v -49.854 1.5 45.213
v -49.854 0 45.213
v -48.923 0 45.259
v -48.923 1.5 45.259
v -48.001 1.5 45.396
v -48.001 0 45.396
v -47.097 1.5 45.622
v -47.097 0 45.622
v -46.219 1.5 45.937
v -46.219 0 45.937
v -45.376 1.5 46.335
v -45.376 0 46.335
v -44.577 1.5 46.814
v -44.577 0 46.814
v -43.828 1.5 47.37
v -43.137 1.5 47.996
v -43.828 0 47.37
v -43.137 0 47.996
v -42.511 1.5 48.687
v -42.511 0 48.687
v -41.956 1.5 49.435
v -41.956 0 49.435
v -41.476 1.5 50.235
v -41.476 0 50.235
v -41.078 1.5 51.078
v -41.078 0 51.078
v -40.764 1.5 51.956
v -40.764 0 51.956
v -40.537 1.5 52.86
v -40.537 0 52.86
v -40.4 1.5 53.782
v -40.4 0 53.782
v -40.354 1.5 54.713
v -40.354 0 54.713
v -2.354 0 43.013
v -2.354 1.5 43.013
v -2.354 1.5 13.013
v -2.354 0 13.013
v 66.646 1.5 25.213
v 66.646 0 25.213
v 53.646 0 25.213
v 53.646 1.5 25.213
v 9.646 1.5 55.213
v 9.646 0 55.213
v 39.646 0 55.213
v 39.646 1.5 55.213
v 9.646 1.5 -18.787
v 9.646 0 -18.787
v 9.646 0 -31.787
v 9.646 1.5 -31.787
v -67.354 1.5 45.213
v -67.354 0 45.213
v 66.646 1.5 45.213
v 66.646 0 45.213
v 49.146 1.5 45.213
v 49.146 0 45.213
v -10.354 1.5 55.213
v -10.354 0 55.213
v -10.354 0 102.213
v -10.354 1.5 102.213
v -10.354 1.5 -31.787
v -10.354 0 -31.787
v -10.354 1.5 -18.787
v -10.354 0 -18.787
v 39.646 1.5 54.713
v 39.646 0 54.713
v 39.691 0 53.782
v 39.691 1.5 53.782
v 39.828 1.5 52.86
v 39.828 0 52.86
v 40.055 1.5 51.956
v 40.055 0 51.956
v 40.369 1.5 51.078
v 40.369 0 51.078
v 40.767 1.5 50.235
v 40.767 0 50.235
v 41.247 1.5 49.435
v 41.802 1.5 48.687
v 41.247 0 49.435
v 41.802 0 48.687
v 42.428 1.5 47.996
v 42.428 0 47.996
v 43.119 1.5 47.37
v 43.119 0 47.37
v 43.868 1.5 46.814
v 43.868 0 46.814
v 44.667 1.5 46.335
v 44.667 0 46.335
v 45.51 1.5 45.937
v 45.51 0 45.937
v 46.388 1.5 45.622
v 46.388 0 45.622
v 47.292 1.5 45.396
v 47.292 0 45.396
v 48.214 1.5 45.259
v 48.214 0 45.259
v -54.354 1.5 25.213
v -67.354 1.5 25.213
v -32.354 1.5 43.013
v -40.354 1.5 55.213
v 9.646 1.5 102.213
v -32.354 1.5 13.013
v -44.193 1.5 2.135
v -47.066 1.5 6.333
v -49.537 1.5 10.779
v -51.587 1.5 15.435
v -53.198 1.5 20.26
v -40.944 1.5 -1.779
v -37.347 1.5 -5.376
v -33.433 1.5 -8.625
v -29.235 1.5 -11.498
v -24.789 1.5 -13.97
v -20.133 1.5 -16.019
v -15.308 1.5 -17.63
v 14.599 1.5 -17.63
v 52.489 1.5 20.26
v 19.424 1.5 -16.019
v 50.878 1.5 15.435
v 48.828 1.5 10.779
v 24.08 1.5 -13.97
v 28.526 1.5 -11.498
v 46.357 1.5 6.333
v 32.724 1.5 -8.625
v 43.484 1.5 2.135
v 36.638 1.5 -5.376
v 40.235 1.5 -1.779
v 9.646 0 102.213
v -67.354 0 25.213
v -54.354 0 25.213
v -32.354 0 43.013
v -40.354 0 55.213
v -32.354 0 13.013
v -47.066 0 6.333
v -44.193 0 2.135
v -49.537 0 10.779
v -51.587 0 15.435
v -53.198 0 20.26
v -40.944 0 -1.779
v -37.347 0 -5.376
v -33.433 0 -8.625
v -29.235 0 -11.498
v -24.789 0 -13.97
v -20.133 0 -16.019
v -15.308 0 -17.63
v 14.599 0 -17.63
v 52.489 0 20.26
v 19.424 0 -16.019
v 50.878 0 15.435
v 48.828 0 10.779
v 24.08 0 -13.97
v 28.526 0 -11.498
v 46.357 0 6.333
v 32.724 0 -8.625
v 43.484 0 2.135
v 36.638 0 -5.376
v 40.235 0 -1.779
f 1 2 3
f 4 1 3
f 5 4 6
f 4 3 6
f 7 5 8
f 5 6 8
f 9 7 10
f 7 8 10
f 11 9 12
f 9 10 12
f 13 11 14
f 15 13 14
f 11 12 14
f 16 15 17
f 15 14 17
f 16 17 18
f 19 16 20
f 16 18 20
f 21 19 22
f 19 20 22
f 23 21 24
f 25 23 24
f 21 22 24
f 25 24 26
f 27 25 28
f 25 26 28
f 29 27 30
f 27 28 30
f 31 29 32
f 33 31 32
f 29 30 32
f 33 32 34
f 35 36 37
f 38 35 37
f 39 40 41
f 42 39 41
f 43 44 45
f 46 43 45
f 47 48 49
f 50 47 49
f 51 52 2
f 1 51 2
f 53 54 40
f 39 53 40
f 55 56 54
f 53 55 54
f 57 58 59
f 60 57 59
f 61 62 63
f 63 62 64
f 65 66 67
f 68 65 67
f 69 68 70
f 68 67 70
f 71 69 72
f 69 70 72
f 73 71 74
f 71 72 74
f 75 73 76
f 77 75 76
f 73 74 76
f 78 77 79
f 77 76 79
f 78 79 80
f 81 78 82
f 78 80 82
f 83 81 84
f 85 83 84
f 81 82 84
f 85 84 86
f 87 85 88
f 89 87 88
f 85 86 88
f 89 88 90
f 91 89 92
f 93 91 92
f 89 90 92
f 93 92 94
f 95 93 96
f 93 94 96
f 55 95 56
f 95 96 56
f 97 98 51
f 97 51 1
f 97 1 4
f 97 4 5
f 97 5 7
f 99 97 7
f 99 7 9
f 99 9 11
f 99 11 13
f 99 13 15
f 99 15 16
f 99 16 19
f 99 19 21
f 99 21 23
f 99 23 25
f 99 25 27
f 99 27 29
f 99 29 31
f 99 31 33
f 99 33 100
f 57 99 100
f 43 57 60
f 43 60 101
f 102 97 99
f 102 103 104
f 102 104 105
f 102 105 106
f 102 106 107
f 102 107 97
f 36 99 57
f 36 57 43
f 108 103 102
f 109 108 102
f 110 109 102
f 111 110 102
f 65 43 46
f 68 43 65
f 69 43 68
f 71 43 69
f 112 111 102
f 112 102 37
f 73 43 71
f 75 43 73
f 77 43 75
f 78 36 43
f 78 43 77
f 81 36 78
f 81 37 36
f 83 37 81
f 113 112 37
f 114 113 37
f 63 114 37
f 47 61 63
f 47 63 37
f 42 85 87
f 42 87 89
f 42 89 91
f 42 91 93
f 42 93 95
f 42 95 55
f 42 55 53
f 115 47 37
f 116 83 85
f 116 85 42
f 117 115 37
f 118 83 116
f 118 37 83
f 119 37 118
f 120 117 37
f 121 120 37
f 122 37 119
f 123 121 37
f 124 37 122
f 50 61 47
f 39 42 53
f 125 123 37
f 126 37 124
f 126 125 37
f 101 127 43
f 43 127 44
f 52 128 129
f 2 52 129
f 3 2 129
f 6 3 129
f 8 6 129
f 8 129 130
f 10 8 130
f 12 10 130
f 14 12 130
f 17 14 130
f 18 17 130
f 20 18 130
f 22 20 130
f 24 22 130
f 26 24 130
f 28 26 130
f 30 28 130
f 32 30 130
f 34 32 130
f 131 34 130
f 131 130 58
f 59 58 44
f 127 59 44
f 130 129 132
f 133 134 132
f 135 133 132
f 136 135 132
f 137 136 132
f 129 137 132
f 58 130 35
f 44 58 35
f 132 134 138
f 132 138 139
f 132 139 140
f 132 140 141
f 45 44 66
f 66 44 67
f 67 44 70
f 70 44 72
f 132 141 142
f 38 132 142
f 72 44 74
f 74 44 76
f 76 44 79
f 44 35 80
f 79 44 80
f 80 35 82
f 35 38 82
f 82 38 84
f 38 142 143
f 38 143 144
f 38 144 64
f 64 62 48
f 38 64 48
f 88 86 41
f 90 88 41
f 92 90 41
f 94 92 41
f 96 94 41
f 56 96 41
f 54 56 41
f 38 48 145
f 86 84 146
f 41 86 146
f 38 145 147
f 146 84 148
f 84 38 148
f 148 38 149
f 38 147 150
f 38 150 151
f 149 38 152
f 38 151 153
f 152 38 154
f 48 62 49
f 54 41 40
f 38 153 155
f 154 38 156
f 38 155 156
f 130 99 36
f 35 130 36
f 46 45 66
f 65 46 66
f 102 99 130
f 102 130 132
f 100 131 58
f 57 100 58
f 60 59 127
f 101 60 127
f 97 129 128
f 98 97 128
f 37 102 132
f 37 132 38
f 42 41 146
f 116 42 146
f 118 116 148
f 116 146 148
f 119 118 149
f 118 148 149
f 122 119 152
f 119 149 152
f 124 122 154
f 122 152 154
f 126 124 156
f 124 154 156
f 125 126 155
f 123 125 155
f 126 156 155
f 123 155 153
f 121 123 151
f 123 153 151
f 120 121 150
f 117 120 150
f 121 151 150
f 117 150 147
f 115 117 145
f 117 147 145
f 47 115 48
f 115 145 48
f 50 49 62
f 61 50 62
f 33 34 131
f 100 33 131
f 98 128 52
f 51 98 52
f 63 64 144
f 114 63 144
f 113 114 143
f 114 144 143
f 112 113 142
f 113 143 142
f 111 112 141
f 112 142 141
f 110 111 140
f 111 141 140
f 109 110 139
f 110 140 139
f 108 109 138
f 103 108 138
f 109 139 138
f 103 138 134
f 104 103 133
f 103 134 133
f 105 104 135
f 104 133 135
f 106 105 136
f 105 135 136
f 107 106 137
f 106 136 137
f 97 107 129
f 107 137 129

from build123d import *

# Parameters (mm, degrees)
SALIENTE_EXTRUIR1_DEPTH = 1.5
CROQUIS2_W              = 30
CROQUIS2_H              = 30
CORTAR_EXTRUIR1_DEPTH   = 123.41919068


with BuildPart() as part:
    # Croquis1 → Saliente-Extruir1 (new body)
    with BuildSketch(Plane(origin=(0, 0, 0), x_dir=(1, 0, 0), z_dir=(0, 1, 0))):
        with BuildLine():
            Line((-10.354497354, 18.78659612), (-10.354497354, -55.21340388))
            Line((-10.354497354, -55.21340388), (-10.354497354, -102.21340388))
            Line((-10.354497354, -102.21340388), (9.645502646, -102.21340388))
            Line((9.645502646, -102.21340388), (9.645502646, -55.21340388))
            Line((9.645502646, -55.21340388), (9.645502646, 18.78659612))
            ThreePointArc((9.645502646, 18.78659612), (-0.354497354, 19.704716991), (-10.354497354, 18.78659612))
        make_face()
        with BuildLine():
            ThreePointArc((53.645502646, -25.21340388), (38.478478323, 3.619571798), (9.645502646, 18.78659612))
            Line((9.645502646, 18.78659612), (9.645502646, -55.21340388))
            Line((9.645502646, -55.21340388), (39.645502646, -55.21340388))
            Line((39.645502646, -55.21340388), (39.645502646, -54.71340388))
            ThreePointArc((39.645502646, -54.71340388), (42.427988224, -47.995889459), (49.145502646, -45.21340388))
            Line((49.145502646, -45.21340388), (66.645502646, -45.21340388))
            Line((66.645502646, -45.21340388), (66.645502646, -25.21340388))
            Line((66.645502646, -25.21340388), (53.645502646, -25.21340388))
        make_face()
        with BuildLine():
            Line((-40.354497354, -54.71340388), (-40.354497354, -55.21340388))
            Line((-40.354497354, -55.21340388), (-10.354497354, -55.21340388))
            Line((-10.354497354, -55.21340388), (-10.354497354, 18.78659612))
            ThreePointArc((-10.354497354, 18.78659612), (-39.187473032, 3.619571798), (-54.354497354, -25.21340388))
            Line((-54.354497354, -25.21340388), (-67.354497354, -25.21340388))
            Line((-67.354497354, -25.21340388), (-67.354497354, -45.21340388))
            Line((-67.354497354, -45.21340388), (-49.854497354, -45.21340388))
            ThreePointArc((-49.854497354, -45.21340388), (-43.136982933, -47.995889459), (-40.354497354, -54.71340388))
        make_face()
        with BuildLine():
            Line((-10.354497354, 31.78659612), (-10.354497354, 18.78659612))
            ThreePointArc((-10.354497354, 18.78659612), (-0.354497354, 19.704716991), (9.645502646, 18.78659612))
            Line((9.645502646, 18.78659612), (9.645502646, 31.78659612))
            Line((9.645502646, 31.78659612), (-10.354497354, 31.78659612))
        make_face()
    extrude(amount=SALIENTE_EXTRUIR1_DEPTH)

    # Croquis2 → Cortar-Extruir1 (cut, through all)
    with BuildSketch(Plane(origin=(0, 1.5, 0), x_dir=(1, 0, 0), z_dir=(0, 1, 0))):
        with Locations((-17.354497354, -28.01340388)):
            Rectangle(CROQUIS2_W, CROQUIS2_H)
    extrude(amount=-CORTAR_EXTRUIR1_DEPTH, mode=Mode.SUBTRACT)


solid = part.part
